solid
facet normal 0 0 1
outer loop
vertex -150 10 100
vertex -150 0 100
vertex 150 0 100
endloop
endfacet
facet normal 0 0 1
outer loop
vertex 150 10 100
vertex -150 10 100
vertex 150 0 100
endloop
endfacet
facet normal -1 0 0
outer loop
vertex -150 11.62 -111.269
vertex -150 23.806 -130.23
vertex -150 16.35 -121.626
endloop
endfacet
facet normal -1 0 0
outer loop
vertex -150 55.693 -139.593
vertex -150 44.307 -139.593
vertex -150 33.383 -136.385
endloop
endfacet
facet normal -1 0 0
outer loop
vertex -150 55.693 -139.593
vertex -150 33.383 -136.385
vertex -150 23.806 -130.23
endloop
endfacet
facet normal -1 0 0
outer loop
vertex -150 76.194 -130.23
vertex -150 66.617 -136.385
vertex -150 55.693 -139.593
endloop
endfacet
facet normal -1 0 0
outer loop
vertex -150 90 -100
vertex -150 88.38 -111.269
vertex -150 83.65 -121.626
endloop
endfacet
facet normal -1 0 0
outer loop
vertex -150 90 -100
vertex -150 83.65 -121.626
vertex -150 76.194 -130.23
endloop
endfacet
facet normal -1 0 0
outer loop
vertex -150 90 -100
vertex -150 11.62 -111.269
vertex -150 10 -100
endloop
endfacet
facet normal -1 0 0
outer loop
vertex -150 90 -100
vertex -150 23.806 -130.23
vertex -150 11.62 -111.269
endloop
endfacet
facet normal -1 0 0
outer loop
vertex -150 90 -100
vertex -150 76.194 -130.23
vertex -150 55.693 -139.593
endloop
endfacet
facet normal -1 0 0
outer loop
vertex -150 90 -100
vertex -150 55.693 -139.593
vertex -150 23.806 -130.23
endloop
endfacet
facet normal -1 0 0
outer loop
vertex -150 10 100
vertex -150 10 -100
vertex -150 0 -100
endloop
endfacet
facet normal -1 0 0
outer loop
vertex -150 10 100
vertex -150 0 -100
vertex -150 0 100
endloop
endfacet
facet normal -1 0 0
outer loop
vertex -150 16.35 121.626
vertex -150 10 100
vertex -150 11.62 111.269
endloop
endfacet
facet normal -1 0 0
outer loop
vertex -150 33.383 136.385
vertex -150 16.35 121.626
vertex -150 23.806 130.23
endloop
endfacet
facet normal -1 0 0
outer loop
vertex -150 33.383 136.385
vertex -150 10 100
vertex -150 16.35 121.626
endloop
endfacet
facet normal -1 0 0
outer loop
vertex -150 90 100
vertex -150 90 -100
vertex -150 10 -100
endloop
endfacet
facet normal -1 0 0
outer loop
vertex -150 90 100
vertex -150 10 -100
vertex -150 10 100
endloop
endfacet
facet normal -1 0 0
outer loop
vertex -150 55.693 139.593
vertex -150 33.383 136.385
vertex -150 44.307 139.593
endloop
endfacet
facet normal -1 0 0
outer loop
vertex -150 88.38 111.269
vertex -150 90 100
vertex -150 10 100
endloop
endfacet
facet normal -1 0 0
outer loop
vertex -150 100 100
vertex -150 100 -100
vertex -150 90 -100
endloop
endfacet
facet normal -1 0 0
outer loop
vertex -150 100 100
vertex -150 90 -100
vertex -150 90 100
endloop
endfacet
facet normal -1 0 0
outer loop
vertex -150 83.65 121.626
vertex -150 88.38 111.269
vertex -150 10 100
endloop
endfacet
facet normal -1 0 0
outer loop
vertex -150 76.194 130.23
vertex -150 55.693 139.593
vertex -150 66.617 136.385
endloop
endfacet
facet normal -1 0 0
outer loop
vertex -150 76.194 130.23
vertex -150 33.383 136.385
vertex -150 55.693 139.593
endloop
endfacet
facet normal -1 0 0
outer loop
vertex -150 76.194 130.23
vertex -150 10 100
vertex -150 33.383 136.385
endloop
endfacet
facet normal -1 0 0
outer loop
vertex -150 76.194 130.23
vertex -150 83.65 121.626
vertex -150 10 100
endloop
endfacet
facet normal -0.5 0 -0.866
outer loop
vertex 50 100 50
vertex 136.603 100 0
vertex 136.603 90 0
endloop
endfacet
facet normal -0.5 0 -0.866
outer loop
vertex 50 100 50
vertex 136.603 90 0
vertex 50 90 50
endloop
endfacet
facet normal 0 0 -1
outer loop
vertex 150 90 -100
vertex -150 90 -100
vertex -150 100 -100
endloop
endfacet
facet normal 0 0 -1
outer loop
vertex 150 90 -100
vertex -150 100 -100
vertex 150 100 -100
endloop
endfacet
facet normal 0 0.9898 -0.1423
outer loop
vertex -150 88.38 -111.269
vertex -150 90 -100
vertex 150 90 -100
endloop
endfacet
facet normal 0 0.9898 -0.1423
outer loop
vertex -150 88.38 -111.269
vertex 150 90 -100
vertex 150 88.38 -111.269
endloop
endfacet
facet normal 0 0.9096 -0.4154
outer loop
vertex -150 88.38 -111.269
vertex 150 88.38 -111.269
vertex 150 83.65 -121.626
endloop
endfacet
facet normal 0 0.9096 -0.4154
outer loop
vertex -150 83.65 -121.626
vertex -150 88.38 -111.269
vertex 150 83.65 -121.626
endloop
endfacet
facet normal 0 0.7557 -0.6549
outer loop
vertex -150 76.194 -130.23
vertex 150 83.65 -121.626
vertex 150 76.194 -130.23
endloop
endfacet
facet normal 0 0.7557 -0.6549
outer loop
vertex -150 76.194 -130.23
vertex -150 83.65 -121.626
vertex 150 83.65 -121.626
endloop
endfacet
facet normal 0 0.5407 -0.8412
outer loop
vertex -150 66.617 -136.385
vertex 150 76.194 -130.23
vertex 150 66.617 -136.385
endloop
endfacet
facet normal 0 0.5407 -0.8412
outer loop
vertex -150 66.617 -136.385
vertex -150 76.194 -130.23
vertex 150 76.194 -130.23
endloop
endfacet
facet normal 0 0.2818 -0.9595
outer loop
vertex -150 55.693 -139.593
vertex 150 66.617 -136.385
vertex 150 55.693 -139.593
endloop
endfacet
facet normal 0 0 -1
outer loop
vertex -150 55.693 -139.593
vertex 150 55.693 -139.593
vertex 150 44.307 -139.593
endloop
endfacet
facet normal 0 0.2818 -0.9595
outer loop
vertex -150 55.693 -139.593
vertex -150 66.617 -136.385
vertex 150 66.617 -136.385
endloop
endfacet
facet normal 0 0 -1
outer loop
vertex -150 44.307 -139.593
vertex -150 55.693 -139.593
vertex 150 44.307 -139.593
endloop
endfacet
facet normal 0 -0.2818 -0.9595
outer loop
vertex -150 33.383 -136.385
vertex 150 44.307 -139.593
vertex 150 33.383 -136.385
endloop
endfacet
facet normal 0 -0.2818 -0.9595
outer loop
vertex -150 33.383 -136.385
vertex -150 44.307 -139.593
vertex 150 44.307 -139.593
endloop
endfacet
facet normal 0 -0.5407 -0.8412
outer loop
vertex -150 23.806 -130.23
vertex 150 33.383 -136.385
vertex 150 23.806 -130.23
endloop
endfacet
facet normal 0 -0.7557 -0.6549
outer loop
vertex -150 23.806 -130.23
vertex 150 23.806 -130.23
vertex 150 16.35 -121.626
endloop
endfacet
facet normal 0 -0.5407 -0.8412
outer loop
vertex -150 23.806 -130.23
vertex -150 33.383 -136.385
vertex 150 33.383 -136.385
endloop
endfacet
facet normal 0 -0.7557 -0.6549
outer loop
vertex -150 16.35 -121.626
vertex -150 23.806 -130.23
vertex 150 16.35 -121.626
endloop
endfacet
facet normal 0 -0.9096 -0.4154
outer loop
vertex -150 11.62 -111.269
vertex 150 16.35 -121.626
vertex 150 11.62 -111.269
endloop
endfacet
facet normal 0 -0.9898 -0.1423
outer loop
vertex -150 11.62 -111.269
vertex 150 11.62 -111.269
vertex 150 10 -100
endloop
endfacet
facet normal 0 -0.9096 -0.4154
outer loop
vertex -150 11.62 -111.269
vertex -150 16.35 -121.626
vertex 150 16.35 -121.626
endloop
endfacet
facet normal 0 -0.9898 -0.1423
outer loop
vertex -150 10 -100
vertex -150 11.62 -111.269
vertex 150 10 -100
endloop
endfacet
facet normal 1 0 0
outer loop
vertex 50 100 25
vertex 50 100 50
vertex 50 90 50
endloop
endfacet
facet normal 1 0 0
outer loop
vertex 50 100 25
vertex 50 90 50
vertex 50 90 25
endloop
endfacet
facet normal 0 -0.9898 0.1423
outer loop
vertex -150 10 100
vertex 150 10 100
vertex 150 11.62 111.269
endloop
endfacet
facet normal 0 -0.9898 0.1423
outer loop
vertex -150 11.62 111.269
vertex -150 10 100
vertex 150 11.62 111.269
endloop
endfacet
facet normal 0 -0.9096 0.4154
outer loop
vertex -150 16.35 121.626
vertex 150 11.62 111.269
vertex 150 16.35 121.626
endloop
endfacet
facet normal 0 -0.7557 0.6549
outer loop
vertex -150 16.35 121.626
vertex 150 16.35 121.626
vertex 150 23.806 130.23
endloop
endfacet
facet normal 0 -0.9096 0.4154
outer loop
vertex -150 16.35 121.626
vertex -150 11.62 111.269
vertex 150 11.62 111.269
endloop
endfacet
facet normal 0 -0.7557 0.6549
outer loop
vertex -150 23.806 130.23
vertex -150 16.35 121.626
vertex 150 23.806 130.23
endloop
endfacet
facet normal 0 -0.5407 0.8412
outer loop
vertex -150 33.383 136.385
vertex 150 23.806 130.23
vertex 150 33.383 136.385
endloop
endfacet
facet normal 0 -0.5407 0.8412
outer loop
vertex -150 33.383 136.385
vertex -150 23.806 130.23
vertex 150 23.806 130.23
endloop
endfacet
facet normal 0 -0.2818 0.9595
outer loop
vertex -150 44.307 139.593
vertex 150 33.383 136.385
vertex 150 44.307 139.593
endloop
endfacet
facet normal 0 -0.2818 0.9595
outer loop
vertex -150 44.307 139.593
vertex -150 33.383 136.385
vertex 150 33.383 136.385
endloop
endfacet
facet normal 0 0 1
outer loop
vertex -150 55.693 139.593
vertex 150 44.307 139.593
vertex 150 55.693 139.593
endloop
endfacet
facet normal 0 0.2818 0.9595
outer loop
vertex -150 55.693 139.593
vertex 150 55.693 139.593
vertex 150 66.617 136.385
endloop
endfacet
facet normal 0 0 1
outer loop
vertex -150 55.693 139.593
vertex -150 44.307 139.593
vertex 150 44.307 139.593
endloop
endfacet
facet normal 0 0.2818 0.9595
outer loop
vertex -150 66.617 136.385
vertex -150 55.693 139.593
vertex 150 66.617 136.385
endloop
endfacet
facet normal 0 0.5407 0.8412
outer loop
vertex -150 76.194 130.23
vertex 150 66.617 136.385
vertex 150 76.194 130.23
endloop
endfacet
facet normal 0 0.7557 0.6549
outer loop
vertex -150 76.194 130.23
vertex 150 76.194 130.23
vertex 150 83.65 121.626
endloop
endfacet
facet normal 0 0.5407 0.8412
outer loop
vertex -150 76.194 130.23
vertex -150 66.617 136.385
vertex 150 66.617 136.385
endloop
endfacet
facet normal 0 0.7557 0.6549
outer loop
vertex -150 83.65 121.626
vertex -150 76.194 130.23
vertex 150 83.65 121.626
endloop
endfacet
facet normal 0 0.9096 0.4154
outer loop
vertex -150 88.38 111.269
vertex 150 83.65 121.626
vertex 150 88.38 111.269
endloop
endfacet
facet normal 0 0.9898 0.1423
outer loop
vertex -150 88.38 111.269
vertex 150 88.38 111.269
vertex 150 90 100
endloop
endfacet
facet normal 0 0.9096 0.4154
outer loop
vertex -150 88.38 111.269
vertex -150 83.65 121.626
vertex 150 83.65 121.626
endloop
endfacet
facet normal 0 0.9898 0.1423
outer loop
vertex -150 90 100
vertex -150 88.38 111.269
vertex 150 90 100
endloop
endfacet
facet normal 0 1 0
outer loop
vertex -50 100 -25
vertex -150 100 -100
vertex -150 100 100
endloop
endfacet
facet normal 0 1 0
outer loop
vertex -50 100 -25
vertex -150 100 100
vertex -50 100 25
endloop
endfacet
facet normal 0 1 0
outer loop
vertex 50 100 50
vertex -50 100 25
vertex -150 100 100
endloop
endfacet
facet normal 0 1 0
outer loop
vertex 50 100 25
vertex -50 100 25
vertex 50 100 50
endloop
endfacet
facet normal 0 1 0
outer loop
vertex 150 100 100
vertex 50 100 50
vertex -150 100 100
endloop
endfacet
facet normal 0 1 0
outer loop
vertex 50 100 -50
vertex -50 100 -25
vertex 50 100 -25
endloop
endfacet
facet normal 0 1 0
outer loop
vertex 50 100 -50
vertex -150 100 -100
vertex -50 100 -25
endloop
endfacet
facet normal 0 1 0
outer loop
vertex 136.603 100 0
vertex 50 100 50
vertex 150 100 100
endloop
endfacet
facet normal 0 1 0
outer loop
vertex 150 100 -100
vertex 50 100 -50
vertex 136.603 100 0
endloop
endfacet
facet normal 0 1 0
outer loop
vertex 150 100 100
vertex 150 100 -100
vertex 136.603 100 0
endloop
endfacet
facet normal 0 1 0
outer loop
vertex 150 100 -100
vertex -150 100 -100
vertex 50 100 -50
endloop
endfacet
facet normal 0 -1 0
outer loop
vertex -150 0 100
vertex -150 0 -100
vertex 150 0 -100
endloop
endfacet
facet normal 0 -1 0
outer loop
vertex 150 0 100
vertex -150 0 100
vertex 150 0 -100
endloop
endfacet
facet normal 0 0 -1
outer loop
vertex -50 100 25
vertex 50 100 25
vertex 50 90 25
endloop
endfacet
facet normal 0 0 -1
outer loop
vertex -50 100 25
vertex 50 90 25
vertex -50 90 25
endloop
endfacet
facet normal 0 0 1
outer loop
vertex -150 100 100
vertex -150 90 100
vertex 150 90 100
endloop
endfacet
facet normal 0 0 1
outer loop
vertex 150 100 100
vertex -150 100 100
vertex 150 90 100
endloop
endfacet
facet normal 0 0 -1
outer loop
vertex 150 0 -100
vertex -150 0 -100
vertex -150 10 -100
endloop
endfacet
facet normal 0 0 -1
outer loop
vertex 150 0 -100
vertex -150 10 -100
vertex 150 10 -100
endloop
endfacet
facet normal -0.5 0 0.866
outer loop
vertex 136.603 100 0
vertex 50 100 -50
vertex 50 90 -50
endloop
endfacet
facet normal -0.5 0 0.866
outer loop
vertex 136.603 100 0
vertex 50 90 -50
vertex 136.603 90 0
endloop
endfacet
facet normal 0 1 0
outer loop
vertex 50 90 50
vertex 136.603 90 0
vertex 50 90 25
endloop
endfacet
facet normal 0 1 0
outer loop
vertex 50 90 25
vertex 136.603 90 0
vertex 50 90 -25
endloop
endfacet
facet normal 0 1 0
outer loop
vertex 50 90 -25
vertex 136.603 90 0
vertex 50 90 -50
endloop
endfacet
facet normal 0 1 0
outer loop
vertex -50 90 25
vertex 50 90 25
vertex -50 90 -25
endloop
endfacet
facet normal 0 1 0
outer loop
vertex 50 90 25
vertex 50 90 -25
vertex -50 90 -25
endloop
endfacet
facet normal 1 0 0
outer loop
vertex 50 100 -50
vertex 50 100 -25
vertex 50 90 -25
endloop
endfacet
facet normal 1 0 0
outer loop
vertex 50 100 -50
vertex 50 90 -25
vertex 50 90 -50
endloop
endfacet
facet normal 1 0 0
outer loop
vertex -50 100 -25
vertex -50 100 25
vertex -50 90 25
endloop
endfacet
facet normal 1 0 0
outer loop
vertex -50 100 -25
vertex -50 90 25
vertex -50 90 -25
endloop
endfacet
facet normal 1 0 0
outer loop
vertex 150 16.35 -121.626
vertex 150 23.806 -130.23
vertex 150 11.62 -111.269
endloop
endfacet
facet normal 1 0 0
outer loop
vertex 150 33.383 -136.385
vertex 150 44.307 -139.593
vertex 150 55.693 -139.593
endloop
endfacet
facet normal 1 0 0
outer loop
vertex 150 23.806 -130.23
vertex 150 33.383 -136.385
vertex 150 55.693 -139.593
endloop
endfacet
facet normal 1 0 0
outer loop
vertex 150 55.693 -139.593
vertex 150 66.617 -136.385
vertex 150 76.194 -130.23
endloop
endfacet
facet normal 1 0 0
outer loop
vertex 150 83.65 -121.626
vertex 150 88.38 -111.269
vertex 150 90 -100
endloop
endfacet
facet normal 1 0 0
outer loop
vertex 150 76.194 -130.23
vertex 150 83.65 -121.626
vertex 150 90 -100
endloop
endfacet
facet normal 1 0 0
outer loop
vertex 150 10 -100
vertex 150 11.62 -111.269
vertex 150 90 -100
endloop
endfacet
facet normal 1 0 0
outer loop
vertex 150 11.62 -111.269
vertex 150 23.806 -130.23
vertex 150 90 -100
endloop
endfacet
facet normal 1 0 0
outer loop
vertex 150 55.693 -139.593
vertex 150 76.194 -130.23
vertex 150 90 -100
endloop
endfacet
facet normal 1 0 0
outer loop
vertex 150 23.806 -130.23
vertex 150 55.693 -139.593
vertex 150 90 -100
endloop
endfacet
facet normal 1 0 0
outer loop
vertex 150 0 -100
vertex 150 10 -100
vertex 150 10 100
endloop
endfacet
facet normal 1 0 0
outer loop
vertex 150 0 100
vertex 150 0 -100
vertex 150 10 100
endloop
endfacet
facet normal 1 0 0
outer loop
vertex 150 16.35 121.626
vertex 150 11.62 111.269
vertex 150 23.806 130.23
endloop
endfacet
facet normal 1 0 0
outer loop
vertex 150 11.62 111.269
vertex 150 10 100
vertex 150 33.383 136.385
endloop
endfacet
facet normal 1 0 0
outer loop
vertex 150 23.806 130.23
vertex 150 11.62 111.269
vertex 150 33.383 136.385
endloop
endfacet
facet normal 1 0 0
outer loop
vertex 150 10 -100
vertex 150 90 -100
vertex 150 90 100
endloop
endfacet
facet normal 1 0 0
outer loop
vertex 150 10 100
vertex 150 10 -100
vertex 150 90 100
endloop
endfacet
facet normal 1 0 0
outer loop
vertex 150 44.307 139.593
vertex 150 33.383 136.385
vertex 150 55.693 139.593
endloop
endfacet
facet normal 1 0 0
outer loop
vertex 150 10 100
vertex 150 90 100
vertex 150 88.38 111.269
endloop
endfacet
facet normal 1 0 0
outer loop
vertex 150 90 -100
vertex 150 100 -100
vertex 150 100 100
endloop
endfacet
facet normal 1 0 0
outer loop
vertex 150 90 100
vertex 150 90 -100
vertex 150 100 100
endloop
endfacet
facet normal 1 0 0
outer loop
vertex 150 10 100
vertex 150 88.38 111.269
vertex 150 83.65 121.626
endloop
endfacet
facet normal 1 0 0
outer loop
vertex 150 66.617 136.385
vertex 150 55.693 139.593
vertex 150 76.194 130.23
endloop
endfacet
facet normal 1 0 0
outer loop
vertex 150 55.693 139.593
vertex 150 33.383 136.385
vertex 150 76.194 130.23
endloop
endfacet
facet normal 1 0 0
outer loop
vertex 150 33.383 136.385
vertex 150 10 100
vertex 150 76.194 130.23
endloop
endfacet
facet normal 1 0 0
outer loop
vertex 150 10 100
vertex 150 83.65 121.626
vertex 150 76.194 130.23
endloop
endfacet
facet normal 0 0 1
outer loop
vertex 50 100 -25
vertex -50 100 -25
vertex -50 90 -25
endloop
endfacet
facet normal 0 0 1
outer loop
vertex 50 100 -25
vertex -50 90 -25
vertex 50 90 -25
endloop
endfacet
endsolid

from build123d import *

# Parameters (mm, degrees)
SKETCH1_W           = 300
SKETCH1_H           = 200
BOSS_EXTRUDE2_DEPTH = 100
SKETCH2_R           = 40
BOSS_EXTRUDE3_DEPTH = 300
CUT_EXTRUDE1_DEPTH  = 10


with BuildPart() as part:
    # Sketch1 → Boss-Extrude2 (new body)
    with BuildSketch(Plane(origin=(0, 0, 0), x_dir=(1, 0, 0), z_dir=(0, 1, 0))):
        Rectangle(SKETCH1_W, SKETCH1_H)
    extrude(amount=BOSS_EXTRUDE2_DEPTH)

    # Sketch2 → Boss-Extrude3 (add)
    with BuildSketch(Plane.ZY.offset(150)):
        with Locations((100, 50)):
            Circle(SKETCH2_R)
        with Locations((-100, 50)):
            Circle(SKETCH2_R)
    extrude(amount=-BOSS_EXTRUDE3_DEPTH)

    # Sketch3 → Cut-Extrude1 (cut)
    with BuildSketch(Plane(origin=(0, 100, 0), x_dir=(1, 0, 0), z_dir=(0, 1, 0))):
        Polygon((50, 25), (50, 50), (136.602540378, 0), (50, -50), (50, -25), (-50, -25), (-50, 25), align=None)
    extrude(amount=-CUT_EXTRUDE1_DEPTH, mode=Mode.SUBTRACT)


solid = part.part
